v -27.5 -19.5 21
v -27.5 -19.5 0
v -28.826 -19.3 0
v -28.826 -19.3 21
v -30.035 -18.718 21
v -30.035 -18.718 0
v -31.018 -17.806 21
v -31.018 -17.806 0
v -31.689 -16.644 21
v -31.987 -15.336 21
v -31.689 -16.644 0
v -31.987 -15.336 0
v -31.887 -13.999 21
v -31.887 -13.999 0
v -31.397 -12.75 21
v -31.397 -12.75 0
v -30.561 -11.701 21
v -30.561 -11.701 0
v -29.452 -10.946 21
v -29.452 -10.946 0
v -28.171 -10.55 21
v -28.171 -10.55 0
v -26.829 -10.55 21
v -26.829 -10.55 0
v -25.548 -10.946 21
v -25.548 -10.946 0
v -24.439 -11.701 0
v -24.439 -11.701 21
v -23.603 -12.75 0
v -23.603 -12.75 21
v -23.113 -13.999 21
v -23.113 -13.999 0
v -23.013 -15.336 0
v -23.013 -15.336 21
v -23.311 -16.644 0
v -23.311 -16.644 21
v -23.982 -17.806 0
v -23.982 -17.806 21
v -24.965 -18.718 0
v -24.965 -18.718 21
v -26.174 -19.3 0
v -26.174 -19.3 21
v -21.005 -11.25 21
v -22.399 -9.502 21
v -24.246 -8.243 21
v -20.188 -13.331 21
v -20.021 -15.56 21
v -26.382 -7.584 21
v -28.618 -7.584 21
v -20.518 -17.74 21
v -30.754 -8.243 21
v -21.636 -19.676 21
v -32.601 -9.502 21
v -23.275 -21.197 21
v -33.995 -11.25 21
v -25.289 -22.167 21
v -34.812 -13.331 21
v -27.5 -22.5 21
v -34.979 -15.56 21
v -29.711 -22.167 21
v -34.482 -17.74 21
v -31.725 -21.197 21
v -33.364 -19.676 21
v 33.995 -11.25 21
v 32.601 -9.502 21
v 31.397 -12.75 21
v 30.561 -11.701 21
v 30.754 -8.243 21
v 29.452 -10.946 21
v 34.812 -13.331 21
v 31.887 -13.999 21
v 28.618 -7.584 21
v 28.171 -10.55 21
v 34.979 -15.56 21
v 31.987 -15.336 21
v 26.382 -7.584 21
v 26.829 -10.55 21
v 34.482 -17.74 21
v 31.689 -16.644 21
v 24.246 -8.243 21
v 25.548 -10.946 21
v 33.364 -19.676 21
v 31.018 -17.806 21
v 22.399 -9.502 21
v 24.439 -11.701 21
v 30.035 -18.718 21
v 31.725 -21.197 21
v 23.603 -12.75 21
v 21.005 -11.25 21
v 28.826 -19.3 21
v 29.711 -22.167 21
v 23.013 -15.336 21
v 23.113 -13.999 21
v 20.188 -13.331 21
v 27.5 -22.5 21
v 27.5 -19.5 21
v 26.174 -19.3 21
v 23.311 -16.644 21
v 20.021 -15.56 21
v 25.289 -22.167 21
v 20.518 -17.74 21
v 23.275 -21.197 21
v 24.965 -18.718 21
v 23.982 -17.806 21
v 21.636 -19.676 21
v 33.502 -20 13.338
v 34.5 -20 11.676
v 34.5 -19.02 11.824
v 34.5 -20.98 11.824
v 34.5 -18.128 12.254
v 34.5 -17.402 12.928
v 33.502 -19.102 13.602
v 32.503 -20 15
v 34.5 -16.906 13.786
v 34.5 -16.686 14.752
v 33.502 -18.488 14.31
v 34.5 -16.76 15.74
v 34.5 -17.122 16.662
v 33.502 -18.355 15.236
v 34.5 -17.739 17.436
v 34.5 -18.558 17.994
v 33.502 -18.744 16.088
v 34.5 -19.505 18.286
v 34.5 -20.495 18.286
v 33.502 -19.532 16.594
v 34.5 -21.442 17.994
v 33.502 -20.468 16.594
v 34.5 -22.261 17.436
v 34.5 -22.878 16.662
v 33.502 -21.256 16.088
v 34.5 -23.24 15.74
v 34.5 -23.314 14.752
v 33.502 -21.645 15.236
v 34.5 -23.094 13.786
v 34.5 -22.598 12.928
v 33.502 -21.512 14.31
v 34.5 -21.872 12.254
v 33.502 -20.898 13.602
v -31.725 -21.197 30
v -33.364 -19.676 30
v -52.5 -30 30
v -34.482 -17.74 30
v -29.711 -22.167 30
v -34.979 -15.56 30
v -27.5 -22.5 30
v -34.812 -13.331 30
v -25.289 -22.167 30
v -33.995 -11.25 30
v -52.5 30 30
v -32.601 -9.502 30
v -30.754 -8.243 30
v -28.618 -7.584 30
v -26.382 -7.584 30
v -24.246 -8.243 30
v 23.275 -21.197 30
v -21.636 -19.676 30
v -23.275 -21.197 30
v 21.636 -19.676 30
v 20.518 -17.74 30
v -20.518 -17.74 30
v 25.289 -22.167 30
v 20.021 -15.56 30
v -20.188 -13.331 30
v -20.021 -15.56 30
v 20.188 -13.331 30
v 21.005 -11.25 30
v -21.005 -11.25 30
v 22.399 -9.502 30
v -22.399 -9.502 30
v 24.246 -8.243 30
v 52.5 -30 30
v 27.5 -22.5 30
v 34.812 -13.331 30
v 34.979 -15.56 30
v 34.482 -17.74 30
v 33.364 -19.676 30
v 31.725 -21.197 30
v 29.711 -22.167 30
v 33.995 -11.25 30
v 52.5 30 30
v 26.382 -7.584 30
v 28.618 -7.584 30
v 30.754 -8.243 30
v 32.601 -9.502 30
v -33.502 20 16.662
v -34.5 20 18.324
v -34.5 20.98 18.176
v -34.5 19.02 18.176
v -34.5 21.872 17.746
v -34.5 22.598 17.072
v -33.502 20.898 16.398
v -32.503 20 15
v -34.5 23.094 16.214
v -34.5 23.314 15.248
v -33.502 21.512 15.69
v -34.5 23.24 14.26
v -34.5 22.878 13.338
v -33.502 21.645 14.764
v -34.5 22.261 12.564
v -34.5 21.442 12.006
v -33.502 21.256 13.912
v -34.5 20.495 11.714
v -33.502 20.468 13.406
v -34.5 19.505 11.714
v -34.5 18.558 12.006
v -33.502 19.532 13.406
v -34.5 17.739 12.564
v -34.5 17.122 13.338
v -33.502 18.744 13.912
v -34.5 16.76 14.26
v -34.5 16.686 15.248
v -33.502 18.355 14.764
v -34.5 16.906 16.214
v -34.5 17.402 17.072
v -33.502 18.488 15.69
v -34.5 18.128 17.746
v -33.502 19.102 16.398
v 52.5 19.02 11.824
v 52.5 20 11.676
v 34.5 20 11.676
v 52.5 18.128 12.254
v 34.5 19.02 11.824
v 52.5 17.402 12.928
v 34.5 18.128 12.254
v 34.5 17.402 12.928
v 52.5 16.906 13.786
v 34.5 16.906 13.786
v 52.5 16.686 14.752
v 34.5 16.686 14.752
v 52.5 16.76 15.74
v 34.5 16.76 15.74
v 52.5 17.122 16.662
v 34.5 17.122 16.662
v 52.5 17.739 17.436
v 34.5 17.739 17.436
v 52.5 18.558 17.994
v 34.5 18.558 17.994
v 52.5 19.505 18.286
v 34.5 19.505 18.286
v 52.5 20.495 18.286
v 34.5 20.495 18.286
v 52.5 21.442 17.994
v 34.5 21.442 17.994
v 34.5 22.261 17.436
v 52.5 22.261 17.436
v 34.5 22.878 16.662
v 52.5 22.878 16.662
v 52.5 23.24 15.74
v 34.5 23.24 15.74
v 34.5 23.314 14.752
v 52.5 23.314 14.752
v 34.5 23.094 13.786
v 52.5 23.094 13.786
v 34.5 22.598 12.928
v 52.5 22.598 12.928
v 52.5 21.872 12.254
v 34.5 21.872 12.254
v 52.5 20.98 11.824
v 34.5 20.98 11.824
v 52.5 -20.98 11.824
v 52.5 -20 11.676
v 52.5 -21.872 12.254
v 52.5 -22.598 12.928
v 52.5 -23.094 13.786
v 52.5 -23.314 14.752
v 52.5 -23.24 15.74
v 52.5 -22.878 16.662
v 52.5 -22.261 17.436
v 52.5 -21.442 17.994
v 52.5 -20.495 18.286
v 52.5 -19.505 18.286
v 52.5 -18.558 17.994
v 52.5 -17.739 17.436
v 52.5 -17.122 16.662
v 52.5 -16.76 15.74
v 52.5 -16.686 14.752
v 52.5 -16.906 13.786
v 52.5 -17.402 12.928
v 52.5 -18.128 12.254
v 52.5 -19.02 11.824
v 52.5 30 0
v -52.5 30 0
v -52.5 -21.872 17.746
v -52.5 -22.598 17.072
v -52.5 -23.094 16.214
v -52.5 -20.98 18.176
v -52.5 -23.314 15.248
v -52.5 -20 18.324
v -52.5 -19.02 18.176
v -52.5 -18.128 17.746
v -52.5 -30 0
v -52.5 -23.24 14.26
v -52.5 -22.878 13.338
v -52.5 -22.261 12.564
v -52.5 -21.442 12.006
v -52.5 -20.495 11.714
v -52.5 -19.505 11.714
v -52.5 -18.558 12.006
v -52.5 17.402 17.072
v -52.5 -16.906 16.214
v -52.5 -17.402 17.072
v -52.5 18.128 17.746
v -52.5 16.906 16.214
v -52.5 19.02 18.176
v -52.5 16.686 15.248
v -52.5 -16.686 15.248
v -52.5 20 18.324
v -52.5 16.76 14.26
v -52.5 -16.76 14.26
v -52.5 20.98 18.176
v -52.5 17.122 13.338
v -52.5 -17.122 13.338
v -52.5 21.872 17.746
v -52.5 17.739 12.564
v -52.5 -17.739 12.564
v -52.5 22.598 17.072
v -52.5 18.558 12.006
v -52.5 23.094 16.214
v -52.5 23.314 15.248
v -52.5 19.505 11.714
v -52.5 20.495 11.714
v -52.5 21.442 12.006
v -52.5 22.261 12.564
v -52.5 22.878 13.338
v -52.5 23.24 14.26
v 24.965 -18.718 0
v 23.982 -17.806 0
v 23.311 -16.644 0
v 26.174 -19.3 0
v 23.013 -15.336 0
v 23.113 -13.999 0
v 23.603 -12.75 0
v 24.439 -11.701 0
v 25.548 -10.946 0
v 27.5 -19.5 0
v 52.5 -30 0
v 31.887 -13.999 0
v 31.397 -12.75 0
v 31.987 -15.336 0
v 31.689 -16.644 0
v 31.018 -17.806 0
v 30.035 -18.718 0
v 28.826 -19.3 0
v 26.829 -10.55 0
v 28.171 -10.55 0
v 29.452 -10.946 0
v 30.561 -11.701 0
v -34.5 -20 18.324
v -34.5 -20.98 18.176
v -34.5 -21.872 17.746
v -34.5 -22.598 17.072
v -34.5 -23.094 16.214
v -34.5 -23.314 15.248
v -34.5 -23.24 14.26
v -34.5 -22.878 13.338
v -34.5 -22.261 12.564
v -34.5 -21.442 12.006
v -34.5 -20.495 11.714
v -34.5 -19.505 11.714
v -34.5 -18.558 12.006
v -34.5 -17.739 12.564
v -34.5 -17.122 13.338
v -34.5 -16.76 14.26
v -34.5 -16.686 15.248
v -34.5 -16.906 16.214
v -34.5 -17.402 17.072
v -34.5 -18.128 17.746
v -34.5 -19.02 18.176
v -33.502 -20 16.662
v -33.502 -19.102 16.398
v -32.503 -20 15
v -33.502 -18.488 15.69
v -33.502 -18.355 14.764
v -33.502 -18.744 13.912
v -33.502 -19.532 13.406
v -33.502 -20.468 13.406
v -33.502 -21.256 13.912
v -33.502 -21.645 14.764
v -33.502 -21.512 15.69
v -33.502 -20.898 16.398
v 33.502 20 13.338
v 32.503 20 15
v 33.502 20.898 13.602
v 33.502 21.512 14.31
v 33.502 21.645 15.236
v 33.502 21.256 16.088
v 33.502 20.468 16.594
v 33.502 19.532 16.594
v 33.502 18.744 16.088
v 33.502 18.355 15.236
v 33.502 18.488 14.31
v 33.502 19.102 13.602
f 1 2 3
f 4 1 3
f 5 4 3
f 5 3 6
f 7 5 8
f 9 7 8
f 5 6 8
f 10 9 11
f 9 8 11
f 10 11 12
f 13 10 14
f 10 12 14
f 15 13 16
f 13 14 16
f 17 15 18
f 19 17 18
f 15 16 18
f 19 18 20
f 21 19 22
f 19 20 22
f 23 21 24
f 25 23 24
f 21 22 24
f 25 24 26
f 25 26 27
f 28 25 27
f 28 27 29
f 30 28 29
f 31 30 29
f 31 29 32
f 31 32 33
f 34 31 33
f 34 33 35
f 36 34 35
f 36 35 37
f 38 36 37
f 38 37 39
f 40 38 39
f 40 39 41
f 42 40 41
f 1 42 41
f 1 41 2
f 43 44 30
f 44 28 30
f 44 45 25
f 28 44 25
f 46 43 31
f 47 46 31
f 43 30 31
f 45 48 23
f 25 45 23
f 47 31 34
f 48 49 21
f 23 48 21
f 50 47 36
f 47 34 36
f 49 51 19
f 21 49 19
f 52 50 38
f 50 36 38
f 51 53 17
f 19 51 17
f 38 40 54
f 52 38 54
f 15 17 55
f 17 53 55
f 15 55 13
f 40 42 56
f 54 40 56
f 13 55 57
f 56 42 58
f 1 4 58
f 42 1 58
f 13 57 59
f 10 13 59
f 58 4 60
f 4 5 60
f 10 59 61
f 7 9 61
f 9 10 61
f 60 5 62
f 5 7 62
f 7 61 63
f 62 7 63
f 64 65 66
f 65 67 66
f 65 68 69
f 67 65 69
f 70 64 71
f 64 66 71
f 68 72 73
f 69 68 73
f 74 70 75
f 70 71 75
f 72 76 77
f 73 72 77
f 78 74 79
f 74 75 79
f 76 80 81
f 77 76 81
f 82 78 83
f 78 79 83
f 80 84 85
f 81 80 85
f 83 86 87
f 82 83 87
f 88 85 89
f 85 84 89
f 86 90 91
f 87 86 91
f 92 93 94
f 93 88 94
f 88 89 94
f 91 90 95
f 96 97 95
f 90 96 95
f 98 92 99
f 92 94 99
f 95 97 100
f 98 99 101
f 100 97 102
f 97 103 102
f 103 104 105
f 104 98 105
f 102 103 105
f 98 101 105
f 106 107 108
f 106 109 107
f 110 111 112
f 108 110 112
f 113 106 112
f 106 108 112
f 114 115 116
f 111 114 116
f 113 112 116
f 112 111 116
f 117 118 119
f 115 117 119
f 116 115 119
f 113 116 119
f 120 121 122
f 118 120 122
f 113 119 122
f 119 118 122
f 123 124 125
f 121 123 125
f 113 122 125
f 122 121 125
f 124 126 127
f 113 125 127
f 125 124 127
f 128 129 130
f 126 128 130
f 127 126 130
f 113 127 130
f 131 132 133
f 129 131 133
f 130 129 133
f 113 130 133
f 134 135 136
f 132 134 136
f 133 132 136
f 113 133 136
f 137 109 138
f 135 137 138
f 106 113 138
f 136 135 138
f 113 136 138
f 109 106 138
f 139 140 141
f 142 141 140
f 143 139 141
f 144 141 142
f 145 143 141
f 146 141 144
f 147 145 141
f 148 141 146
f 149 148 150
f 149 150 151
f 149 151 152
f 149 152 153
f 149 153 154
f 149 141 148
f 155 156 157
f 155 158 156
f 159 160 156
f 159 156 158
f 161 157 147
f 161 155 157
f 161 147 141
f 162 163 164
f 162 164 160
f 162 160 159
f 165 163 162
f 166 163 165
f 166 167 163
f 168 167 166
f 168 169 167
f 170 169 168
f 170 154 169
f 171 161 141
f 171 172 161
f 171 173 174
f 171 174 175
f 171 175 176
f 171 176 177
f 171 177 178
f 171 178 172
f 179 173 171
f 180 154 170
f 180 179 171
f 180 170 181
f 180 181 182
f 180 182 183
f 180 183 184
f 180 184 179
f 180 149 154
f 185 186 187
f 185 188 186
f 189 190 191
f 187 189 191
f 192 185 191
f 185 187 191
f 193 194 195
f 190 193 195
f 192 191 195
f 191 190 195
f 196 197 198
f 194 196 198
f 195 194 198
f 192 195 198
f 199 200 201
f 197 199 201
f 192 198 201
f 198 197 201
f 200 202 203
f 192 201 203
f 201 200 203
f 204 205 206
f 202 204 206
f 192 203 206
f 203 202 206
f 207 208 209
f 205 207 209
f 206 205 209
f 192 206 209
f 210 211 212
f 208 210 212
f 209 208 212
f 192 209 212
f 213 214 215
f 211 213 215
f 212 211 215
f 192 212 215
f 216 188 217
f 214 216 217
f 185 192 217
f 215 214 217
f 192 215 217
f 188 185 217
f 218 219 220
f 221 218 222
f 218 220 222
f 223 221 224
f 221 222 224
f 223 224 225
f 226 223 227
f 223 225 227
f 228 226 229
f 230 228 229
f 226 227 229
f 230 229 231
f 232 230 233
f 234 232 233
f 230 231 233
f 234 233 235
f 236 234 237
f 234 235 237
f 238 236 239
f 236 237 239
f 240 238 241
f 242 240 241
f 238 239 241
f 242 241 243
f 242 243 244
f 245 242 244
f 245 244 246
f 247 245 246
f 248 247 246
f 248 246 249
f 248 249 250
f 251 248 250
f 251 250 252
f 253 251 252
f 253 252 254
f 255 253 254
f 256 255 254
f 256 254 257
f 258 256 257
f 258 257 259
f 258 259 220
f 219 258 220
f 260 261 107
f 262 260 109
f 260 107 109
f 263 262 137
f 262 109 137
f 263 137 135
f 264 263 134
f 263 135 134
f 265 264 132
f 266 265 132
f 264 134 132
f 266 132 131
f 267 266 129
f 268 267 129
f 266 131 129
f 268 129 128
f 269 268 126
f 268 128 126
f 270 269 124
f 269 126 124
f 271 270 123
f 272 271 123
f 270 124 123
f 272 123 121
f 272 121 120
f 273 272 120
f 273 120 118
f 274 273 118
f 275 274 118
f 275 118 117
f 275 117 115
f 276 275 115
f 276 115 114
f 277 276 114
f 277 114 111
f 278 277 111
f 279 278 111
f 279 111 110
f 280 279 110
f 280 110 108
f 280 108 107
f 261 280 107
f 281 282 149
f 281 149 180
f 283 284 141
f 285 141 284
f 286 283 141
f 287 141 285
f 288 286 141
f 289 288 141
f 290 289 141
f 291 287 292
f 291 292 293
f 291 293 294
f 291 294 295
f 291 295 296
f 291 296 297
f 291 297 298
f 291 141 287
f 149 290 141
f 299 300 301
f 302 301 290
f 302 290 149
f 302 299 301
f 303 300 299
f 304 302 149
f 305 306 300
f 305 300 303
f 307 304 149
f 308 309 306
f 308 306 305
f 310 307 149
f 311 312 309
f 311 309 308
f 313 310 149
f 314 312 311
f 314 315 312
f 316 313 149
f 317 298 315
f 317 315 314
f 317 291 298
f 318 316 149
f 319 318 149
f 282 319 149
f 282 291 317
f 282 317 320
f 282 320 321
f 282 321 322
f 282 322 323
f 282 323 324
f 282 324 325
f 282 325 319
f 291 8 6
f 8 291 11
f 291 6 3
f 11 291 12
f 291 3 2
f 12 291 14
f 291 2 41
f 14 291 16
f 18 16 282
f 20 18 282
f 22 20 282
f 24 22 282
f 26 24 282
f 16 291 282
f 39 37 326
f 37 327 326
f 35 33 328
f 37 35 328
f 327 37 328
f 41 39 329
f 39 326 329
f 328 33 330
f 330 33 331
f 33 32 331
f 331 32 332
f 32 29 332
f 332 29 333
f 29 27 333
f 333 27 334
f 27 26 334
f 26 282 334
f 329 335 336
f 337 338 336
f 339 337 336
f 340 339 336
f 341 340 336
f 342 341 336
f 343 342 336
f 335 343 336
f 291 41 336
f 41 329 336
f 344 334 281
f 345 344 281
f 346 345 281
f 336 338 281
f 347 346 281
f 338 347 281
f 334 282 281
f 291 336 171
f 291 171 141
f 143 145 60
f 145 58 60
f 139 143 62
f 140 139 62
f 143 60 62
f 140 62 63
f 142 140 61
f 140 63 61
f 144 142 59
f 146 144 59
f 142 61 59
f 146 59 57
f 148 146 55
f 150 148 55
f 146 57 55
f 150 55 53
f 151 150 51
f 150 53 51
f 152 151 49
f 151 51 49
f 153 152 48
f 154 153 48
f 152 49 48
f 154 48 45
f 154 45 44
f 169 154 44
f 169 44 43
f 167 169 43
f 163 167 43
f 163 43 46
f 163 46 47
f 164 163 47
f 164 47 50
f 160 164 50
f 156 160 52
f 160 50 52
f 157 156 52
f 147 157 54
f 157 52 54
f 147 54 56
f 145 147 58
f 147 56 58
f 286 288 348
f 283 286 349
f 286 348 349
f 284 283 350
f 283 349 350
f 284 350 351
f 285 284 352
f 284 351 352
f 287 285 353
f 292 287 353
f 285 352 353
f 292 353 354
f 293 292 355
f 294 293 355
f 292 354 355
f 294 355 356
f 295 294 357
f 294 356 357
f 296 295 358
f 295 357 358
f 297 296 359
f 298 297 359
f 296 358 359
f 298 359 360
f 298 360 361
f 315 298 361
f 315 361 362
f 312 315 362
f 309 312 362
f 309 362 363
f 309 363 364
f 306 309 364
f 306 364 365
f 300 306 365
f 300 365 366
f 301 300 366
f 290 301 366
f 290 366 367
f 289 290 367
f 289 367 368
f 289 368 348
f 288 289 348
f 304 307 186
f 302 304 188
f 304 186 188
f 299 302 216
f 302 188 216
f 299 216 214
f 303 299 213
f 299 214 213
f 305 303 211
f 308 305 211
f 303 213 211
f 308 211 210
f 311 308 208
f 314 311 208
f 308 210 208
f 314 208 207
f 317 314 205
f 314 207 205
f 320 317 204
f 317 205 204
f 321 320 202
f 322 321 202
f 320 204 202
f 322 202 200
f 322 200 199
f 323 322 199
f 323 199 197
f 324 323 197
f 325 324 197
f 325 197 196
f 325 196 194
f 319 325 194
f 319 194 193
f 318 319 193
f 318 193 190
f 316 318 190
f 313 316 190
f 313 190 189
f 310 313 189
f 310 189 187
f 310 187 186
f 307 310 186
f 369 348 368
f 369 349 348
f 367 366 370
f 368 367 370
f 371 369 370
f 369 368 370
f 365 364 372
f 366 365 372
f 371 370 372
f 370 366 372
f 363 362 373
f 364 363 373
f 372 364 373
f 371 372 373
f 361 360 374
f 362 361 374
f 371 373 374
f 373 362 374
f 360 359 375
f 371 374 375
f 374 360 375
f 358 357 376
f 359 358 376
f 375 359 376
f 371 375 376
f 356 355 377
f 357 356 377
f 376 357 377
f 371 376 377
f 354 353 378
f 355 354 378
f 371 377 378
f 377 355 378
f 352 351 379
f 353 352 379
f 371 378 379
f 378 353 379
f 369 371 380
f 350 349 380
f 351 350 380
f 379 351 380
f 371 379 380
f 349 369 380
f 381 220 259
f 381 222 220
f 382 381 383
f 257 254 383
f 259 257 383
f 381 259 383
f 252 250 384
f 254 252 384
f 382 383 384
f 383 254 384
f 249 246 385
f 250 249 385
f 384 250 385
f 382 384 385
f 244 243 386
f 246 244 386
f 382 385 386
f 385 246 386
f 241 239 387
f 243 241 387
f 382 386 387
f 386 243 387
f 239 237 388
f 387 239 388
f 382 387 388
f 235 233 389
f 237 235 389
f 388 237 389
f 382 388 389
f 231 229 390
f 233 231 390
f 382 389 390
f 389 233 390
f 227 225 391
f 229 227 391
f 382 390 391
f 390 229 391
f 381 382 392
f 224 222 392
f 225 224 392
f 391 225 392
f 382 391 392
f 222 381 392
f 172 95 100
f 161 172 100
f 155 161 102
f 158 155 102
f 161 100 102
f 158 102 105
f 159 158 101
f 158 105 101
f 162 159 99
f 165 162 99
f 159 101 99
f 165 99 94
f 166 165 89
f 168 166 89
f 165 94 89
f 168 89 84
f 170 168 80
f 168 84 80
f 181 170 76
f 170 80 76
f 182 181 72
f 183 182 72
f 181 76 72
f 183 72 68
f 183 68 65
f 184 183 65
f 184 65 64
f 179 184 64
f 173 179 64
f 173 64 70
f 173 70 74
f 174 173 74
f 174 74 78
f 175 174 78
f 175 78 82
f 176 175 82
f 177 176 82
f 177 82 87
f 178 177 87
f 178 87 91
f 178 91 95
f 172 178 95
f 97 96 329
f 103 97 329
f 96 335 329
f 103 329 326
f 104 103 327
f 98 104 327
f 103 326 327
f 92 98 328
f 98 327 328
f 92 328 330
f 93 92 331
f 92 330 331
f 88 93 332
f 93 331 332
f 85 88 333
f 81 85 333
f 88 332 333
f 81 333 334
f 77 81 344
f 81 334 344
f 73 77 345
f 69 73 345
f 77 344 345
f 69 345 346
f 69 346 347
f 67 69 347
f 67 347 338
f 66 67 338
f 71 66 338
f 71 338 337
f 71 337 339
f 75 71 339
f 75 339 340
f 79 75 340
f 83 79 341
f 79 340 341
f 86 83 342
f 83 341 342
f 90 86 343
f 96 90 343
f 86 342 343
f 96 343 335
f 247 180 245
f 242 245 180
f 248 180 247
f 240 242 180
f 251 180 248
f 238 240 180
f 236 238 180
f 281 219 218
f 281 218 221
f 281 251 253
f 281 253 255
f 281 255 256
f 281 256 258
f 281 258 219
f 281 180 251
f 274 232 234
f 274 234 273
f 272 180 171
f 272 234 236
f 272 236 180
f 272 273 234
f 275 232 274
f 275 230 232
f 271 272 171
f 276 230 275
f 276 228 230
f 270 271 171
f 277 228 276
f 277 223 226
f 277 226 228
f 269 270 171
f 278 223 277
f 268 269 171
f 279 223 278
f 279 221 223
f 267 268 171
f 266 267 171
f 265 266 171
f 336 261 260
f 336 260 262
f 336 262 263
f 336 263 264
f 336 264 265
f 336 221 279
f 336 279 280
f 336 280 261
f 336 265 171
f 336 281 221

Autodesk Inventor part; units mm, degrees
ref_plane "YZ Plane" through (0, 0, 0) normal (1, 0, 0) x (0, 1, 0)
ref_plane "XZ Plane" through (0, 0, 0) normal (0, 1, 0) x (-1, 0, 0)
ref_plane "XY Plane" through (0, 0, 0) normal (0, 0, 1) x (1, 0, 0)
sketch "Sketch5" plane through (0, 0, 0) normal (0, 0, 1) x (1, 0, 0)
  line L0 (-52.5, 30) -> (52.5, 30)
  line L1 (52.5, 30) -> (52.5, -30)
  line L2 (52.5, -30) -> (-52.5, -30)
  line L3 (-52.5, -30) -> (-52.5, 30)
  point P0 (0, 0)
  point P1 (0, 30)
  point P2 (52.5, 0)
  dimension "d8" = 60
  dimension "d9" = 105
extrude "Extrusion5" add sketch "Sketch5" along normal blind 30
sketch "Sketch6" plane through (0, 0, 30) normal (0, 0, 1) x (1, 0, 0)
  circle A0 centre (-27.5, -15) radius 4
  circle A1 centre (27.5, -15) radius 4
  line L0 (-52.5, -30) -> (52.5, -30) projected
  point P0 (0, 0)
  dimension "d12" = 55
  dimension "d13" = 27.5
  dimension "d14" = 8
  dimension "d39" = 15
hole "Hole1" at (-27.5, -15, 30) at (27.5, -15, 30) direction (0, 0, -1) diameter 9 end through all counterbore diameter 15 counterbore depth 9 clearance for "Socket Head Cap Screw DIN EN ISO 4762" size "M8" standard "DIN"
sketch "Sketch7" plane through (-52.5, -30, 0) normal (-1, 0, 0) x (0, 0, 1)
  line L0 (0, 0) -> (30, 0) projected
  line L1 (0, 60) -> (30, 60) projected
  circle A0 centre (15, 50) radius 4
  circle A1 centre (15, 10) radius 4
  point P0 (0, 30)
  point P1 (15, 60)
  point P2 (15, 0)
  dimension "d22" = 40
  dimension "d23" = 20
  dimension "d24" = 8
hole "Hole2" at (-52.5, 20, 15) at (-52.5, -20, 15) direction (1, 0, 0) diameter 6.647 depth 18 tip angle 118 thread size "M8x1.25" class "6H" standard "ISO Metric profile"
sketch "Sketch8" plane through (52.5, -30, 0) normal (1, 0, 0) x (0, 0, -1)
  circle A0 centre (-15, 10) radius 3.3235
  circle A1 centre (-15, 50) radius 3.3235
  circle A2 centre (-15, 10) radius 3.3235 projected
  circle A3 centre (-15, 50) radius 3.3235 projected
  point P0 (0, 30)
hole "Hole3" at (52.5, -20, 15) at (52.5, 20, 15) direction (-1, 0, 0) diameter 6.647 depth 18 tip angle 118 thread size "M8x1.25" class "6H" standard "ISO Metric profile"
equation "\"d13\" = 0.5 * d12"
equation "\"d23\" = 0.5 * d22"
properties part number "BC-10012" material "Alumínio 7075"
